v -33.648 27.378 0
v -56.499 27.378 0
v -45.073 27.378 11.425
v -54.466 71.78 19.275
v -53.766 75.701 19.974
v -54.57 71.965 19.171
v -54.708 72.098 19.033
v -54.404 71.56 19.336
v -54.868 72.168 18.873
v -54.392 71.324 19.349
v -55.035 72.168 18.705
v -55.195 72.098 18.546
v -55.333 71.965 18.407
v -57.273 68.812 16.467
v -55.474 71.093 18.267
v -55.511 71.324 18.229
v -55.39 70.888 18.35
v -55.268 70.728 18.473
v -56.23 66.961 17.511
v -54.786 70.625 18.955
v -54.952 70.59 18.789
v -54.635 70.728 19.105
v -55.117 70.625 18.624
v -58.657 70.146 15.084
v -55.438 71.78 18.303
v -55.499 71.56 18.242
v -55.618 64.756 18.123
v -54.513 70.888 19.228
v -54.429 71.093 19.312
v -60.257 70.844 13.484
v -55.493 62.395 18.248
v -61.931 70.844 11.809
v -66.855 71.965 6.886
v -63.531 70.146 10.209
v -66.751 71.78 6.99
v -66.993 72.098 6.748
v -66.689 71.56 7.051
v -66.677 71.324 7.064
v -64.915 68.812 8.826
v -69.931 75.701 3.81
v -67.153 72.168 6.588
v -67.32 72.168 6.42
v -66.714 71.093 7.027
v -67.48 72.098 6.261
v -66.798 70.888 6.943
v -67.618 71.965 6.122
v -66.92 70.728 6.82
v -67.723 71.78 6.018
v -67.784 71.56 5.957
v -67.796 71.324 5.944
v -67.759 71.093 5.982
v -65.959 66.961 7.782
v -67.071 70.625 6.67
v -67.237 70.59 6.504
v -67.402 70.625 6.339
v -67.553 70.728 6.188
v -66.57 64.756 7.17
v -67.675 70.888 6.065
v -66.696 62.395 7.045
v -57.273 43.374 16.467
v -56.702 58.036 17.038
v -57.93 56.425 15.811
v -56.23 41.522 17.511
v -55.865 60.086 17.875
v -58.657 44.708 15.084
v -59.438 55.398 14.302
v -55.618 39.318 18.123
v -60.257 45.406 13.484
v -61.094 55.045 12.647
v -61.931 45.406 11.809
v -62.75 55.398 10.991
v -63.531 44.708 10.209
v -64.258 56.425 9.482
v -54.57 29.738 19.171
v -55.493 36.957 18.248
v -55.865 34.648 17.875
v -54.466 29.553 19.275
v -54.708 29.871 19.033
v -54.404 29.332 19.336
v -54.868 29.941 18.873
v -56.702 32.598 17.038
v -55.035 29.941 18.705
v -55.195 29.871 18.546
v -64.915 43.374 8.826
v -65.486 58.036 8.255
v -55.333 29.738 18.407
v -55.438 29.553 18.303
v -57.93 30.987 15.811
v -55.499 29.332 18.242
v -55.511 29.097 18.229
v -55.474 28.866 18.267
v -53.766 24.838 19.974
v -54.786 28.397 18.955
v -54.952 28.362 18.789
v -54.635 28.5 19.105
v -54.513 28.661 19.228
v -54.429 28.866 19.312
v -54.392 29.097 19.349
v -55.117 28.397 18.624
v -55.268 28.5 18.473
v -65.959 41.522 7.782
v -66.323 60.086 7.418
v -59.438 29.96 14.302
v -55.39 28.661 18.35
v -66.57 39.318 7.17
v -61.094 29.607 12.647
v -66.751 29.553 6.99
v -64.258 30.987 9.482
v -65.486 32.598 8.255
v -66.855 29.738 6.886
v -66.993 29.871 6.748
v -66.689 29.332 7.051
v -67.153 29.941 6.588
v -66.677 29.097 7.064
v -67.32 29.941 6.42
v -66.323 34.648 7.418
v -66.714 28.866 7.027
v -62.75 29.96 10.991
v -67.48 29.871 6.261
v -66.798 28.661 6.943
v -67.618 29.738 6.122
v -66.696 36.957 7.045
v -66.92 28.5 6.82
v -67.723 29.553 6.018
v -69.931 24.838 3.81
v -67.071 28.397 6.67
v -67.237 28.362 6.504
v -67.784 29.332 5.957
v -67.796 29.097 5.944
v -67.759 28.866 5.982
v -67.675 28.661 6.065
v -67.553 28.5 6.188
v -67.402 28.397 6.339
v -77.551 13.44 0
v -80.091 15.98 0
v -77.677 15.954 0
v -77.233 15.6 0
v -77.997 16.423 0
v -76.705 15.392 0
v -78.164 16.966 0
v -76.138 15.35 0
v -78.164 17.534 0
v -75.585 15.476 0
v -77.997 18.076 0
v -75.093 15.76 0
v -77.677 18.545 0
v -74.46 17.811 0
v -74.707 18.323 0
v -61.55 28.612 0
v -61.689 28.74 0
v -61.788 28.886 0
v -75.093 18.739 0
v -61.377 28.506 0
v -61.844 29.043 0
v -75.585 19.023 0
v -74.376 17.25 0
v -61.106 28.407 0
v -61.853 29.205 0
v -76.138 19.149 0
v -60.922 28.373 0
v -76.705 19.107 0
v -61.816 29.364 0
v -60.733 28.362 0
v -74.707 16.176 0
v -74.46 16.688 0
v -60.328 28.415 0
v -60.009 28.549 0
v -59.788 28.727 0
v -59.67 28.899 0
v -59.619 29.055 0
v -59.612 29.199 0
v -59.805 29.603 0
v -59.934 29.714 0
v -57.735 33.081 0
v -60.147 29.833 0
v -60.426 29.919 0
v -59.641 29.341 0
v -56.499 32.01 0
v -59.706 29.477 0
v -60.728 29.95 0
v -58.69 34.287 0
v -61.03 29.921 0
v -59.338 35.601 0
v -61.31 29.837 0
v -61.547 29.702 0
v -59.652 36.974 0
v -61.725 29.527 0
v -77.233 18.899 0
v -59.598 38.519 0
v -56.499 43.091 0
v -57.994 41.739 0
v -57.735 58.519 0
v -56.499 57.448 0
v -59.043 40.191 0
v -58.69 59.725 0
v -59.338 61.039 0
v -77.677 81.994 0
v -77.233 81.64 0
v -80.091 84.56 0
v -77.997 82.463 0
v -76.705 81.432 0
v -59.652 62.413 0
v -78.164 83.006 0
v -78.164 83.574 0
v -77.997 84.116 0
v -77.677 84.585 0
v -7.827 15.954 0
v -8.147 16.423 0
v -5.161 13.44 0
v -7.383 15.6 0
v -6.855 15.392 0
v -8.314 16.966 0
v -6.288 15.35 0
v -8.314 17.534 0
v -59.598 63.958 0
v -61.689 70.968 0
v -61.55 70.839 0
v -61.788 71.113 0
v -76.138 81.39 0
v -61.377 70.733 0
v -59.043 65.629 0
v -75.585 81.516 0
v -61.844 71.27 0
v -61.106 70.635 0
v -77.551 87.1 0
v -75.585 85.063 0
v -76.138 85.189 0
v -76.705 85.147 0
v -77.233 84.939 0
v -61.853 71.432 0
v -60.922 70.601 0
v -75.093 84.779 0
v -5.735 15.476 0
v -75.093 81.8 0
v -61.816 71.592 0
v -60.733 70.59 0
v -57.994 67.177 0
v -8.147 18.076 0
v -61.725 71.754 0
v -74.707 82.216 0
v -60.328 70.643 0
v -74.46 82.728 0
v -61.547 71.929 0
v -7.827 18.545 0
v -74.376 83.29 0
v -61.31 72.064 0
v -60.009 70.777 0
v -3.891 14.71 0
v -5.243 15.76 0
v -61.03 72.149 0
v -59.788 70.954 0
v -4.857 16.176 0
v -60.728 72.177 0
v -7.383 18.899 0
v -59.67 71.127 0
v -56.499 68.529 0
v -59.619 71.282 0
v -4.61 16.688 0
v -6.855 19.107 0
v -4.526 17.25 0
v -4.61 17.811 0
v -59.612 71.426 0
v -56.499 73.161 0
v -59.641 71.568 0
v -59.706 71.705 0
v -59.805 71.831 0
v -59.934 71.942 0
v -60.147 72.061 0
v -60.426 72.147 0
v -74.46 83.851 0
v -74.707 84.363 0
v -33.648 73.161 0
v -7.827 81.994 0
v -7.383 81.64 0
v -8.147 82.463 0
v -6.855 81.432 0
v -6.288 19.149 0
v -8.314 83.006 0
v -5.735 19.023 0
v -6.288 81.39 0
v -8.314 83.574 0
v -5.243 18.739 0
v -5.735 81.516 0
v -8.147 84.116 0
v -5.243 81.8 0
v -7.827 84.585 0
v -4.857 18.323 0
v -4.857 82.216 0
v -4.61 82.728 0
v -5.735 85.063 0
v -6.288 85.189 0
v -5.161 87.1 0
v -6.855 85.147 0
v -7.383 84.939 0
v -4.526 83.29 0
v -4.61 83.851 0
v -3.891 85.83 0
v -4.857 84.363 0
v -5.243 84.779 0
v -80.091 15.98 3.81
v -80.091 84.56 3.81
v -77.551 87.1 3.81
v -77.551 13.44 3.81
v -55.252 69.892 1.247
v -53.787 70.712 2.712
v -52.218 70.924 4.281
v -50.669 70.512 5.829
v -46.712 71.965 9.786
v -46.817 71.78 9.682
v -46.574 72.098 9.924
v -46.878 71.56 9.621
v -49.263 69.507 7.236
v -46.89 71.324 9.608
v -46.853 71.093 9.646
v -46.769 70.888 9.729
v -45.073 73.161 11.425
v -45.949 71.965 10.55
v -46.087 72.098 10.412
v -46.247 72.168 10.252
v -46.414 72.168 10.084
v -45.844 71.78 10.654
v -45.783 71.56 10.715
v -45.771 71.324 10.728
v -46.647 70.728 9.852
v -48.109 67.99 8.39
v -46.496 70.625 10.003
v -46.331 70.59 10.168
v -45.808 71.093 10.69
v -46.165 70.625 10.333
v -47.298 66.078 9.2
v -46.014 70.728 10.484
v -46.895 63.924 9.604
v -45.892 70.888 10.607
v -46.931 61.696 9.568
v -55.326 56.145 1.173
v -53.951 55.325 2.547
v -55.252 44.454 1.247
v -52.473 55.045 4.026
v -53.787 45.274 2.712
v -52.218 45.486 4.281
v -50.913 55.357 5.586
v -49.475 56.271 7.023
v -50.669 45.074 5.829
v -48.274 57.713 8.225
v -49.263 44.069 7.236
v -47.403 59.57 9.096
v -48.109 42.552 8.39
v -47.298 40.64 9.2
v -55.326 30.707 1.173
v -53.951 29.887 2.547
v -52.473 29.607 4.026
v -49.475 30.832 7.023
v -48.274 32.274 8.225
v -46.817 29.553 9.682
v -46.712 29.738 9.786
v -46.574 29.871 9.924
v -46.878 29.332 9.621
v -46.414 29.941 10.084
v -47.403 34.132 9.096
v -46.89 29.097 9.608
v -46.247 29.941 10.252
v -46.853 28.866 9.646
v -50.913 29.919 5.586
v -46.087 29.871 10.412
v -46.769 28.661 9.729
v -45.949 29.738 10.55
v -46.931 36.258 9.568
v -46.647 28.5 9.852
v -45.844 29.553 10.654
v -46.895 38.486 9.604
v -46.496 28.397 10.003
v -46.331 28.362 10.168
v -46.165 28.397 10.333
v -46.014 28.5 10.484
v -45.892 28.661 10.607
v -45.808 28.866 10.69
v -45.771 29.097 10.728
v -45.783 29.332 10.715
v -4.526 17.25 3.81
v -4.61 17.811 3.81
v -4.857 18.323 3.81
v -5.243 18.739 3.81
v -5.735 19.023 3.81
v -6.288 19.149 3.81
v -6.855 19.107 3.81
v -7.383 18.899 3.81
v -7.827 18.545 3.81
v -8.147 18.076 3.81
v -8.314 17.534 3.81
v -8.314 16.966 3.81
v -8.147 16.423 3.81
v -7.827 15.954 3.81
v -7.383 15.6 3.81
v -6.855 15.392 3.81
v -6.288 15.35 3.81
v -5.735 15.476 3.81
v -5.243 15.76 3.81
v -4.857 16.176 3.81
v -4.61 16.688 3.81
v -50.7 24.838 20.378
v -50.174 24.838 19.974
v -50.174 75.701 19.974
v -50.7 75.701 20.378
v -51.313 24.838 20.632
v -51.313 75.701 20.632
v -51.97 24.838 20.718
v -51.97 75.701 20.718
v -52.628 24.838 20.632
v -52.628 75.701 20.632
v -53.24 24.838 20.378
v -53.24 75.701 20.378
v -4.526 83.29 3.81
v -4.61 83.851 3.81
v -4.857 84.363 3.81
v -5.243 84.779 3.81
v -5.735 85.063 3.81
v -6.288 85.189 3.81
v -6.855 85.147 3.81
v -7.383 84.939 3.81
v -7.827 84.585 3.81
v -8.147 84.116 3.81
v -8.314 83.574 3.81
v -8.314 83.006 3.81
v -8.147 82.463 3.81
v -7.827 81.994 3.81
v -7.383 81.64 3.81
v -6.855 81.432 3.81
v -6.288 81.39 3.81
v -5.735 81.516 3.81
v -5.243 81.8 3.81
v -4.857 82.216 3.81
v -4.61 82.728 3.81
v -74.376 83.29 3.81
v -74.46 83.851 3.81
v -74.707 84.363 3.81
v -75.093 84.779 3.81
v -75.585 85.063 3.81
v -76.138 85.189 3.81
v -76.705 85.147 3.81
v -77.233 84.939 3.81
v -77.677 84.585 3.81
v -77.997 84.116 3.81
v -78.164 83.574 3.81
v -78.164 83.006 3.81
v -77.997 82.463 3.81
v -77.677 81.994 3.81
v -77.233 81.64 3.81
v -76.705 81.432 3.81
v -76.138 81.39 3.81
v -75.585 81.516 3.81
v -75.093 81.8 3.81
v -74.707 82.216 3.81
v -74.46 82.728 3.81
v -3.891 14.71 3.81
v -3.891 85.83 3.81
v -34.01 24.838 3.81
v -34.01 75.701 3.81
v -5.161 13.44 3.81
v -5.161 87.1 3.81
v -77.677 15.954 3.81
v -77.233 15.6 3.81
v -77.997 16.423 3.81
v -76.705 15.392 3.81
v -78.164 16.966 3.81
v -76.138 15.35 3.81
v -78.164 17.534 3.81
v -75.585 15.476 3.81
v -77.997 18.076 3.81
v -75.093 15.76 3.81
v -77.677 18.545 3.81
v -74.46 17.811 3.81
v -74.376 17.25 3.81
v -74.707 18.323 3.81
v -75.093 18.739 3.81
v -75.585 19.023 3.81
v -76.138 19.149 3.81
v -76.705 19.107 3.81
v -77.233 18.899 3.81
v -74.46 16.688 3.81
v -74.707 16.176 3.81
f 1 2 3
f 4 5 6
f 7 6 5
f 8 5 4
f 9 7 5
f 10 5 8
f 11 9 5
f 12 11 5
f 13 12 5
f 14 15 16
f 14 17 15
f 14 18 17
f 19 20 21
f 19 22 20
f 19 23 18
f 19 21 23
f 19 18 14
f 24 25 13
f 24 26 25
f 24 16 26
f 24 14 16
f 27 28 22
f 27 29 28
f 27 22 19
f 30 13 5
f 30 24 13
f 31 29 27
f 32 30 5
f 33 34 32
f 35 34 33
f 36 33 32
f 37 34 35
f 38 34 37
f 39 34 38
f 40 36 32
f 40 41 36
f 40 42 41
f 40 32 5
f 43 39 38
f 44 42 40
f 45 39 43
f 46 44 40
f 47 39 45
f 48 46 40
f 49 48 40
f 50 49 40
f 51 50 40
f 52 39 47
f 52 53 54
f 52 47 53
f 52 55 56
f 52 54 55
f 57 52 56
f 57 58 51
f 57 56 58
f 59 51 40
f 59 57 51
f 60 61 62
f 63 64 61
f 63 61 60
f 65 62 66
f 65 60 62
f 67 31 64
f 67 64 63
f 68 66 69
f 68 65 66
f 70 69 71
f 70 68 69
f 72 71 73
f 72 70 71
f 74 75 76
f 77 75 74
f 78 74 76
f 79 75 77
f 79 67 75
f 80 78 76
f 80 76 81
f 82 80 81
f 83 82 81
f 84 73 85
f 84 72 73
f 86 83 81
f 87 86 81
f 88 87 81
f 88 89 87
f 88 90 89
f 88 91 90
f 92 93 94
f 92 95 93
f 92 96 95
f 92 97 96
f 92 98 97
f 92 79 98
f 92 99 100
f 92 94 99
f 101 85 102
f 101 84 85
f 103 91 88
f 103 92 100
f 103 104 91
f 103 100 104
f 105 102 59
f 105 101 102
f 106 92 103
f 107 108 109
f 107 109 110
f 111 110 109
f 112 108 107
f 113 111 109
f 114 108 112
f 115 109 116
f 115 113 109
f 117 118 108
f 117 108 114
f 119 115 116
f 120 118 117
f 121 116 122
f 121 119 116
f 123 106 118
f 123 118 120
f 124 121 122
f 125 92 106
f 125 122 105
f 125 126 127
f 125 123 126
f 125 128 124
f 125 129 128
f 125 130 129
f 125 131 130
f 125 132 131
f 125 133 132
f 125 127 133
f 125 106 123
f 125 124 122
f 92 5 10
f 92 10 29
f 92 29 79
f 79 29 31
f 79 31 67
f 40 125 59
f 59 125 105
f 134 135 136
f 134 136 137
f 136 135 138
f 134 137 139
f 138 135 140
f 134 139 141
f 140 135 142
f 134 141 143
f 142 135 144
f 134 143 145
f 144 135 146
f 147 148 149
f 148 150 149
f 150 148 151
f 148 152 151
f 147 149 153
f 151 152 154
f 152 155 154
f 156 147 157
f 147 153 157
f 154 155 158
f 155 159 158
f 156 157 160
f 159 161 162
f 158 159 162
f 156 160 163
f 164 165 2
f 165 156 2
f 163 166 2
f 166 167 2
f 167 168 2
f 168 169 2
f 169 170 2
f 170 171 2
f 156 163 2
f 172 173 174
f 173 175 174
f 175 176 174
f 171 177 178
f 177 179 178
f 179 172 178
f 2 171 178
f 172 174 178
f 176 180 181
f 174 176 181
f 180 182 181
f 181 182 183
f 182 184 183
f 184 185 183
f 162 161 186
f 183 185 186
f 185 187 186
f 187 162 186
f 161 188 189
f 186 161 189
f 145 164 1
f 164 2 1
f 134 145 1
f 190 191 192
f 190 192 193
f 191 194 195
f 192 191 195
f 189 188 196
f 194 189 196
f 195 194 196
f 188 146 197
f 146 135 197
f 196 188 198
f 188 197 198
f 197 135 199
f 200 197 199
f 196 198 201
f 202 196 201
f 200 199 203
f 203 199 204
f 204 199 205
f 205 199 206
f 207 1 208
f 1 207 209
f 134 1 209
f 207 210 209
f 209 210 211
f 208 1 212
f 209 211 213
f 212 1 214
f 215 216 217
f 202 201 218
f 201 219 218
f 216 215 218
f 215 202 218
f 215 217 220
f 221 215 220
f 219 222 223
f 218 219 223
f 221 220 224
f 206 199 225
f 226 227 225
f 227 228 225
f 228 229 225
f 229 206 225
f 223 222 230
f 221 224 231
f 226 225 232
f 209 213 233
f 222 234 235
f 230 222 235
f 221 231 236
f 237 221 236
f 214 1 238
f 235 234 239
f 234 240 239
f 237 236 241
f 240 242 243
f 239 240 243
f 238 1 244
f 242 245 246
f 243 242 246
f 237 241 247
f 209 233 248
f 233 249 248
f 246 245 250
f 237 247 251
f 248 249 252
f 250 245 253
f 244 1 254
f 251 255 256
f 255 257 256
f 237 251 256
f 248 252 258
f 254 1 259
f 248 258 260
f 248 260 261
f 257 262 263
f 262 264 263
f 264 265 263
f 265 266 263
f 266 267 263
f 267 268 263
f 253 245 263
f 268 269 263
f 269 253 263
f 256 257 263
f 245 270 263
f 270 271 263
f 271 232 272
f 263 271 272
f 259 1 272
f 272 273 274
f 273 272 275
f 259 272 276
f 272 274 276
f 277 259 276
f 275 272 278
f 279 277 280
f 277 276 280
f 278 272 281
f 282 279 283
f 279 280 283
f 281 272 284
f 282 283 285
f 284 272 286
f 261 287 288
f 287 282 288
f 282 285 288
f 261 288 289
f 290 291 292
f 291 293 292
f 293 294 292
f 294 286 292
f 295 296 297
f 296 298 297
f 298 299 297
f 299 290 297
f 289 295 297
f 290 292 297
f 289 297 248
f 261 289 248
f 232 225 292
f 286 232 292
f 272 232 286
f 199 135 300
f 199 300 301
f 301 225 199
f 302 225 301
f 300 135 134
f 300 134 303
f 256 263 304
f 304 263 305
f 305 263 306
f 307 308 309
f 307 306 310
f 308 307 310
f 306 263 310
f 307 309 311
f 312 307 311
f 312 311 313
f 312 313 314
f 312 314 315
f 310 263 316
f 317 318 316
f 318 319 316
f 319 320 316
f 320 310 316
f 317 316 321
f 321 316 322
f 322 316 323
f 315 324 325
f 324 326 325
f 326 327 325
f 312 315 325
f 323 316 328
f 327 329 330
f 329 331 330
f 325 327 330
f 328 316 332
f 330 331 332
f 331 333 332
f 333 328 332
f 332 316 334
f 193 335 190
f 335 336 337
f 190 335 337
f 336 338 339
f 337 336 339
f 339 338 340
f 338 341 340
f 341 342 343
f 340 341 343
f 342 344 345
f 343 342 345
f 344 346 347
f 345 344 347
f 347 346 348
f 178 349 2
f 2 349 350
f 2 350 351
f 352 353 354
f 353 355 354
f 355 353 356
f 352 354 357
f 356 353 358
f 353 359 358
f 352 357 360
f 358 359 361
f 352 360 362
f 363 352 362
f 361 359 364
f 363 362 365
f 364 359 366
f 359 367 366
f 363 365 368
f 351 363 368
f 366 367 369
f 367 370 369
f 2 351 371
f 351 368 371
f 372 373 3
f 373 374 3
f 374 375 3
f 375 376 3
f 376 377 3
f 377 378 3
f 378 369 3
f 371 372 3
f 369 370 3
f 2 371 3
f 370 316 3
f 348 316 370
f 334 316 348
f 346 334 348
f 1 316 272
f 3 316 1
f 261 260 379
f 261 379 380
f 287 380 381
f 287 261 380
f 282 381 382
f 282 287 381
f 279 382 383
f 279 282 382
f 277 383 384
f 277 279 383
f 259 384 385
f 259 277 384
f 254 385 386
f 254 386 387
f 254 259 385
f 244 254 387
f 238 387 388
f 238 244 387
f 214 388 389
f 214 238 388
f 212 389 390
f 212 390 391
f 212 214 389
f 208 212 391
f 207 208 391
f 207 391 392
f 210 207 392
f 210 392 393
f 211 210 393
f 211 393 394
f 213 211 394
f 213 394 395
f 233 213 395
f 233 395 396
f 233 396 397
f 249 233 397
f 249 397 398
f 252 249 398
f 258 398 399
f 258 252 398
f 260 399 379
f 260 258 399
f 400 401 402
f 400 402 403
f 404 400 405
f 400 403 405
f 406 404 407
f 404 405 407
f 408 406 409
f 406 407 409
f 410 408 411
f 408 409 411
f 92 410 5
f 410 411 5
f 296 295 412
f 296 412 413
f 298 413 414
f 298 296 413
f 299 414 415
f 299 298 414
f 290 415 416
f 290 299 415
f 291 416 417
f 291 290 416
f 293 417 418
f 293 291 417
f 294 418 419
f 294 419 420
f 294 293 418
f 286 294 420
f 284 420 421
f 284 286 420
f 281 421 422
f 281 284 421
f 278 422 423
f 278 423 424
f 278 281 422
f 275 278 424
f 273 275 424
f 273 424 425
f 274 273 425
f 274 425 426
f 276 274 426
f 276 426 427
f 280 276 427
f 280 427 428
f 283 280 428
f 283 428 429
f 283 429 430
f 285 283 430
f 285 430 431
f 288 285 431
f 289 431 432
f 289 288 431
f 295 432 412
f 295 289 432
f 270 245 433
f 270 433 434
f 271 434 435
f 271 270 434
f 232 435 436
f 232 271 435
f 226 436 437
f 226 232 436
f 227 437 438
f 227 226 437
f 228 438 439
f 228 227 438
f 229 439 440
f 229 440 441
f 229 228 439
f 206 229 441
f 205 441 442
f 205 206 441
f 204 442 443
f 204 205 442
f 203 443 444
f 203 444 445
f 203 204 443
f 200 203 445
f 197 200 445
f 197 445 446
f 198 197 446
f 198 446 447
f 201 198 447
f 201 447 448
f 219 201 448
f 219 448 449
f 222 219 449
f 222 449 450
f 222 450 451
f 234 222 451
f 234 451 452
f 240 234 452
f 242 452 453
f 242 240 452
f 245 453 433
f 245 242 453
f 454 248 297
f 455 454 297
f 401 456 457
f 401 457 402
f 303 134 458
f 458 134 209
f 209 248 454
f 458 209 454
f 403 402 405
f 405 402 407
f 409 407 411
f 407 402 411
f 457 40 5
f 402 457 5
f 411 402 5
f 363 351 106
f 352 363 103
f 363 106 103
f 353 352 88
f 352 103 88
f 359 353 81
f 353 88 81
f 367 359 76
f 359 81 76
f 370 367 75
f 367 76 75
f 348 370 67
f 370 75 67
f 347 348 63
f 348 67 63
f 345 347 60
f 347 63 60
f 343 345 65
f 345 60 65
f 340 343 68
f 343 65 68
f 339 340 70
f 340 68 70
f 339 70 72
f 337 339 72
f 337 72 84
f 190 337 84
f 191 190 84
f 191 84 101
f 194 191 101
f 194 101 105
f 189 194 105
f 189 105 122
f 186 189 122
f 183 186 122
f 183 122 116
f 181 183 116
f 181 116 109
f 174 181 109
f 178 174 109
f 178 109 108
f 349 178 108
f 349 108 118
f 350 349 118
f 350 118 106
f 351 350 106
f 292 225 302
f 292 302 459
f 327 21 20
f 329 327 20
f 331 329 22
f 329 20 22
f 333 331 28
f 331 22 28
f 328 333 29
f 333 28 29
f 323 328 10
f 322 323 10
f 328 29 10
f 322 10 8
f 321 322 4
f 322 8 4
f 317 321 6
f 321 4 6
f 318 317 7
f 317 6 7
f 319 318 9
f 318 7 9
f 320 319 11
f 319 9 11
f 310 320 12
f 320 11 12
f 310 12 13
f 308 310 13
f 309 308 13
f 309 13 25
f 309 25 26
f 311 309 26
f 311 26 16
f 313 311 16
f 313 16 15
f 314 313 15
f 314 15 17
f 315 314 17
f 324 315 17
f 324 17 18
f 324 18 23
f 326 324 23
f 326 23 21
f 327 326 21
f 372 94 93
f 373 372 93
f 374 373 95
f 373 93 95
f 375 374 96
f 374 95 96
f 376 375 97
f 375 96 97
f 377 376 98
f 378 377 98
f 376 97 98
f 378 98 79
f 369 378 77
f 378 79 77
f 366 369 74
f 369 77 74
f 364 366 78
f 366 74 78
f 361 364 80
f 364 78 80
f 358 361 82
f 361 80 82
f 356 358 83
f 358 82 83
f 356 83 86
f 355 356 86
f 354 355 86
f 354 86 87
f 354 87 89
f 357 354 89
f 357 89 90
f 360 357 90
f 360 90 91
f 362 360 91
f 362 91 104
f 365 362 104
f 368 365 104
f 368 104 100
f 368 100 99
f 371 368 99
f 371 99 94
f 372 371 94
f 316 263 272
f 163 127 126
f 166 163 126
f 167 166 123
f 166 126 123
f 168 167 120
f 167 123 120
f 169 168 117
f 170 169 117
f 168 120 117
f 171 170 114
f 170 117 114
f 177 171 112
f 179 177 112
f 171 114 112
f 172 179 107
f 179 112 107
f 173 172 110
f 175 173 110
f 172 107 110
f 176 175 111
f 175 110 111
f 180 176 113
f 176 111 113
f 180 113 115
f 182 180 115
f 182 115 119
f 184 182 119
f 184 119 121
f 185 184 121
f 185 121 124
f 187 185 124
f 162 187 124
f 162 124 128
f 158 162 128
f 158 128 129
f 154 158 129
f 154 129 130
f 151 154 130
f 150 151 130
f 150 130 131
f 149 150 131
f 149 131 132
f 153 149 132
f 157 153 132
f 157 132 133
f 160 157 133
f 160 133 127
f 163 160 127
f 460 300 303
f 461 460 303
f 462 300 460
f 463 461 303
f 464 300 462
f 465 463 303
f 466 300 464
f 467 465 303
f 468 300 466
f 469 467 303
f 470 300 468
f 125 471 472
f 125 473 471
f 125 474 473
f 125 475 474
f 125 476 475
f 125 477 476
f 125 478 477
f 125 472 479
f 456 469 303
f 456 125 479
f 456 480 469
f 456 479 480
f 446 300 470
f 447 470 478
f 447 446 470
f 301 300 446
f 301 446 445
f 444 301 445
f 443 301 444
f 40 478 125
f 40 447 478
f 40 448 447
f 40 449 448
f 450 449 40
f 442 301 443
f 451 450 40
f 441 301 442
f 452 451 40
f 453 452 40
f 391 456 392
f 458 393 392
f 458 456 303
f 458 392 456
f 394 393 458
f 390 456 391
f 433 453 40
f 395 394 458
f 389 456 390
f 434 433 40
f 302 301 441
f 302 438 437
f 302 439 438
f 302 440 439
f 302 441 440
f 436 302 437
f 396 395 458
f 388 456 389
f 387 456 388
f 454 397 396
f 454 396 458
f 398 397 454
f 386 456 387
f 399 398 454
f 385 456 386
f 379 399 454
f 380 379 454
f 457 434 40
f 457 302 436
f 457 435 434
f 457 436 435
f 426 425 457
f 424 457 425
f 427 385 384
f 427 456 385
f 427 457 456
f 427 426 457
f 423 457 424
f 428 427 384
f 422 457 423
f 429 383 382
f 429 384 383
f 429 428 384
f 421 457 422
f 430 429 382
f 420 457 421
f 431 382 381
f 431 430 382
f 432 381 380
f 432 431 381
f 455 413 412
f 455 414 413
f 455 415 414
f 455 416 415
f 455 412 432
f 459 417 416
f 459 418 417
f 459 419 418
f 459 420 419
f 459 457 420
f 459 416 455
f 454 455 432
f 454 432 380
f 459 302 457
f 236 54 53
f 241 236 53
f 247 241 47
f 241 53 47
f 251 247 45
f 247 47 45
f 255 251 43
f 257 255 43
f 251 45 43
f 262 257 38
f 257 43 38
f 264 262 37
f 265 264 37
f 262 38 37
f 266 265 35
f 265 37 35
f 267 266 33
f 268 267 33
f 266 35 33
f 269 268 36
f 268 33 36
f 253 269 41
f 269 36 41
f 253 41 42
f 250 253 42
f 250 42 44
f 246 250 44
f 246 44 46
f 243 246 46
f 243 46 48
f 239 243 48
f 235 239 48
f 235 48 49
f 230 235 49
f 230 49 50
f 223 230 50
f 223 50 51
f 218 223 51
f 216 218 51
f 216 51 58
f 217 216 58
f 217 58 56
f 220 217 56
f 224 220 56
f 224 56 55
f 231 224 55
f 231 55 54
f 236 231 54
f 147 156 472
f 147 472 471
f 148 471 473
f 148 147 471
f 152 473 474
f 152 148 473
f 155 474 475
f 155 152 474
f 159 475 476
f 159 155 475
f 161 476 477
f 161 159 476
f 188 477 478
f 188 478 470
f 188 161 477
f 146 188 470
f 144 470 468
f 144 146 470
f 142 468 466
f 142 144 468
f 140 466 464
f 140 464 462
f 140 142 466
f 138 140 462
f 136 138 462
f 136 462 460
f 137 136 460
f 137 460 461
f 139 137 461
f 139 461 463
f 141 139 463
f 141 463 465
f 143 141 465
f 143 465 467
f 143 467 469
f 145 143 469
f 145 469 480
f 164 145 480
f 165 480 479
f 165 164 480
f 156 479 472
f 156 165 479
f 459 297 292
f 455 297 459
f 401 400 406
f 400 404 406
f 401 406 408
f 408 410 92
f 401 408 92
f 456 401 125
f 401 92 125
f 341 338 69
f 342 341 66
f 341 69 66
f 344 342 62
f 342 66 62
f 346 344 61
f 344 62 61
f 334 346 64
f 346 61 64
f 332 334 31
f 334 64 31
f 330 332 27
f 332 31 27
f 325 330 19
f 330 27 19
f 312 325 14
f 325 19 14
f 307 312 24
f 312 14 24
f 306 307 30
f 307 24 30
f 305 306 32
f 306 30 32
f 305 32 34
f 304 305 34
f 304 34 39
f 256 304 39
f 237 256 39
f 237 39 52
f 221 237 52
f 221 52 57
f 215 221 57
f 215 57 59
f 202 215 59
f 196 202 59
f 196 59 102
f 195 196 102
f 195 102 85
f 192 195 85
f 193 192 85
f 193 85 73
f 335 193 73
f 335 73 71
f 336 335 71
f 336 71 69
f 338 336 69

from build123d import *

# Parameters (mm, degrees)
F0_W      = 76.2
F0_H      = 73.66
F0_R      = 1.905
F1_DEPTH  = 3.81
F2_SIZE   = 1.27
F3_SIZE   = 2.54
F5_DEPTH  = 73.66
F6_R      = 7.94385
F6_R_2    = 0.79375
F7_DEPTH  = 49.3924086659
F9_W      = 45.7835
F9_H      = 20.9296
F9_W_2    = 45.2755
F9_H_2    = 20.4216
F9_R      = 0.79375
F10_DEPTH = 25.4
F12_DEPTH = 76.201
F13_R     = 2.54


with BuildPart() as f1:
    # F0 (on Top) → F1 (new body)
    with BuildSketch(Plane.XY):
        with Locations((-41.9906750321, 50.2695810336)):
            Rectangle(F0_W, F0_H)
        with Locations((-76.2806750321, 17.2495810336)):
            Circle(F0_R, mode=Mode.SUBTRACT)
        with Locations((-6.4306750321, 17.2495810336)):
            Circle(F0_R, mode=Mode.SUBTRACT)
        with Locations((-76.2806750321, 83.2895810336)):
            Circle(F0_R, mode=Mode.SUBTRACT)
        with Locations((-6.4306750321, 83.2895810336)):
            Circle(F0_R, mode=Mode.SUBTRACT)
    extrude(amount=F1_DEPTH)

    # F2
    f2_edges = [f1.edges().sort_by_distance(p)[0] for p in [
        (-3.890675, 13.439581, 1.905),
        (-3.890675, 87.099581, 1.905),
    ]]
    chamfer(f2_edges, length=F2_SIZE)

    # F3
    f3_edges = [f1.edges().sort_by_distance(p)[0] for p in [
        (-80.090675, 13.439581, 1.905),
        (-80.090675, 87.099581, 1.905),
    ]]
    chamfer(f3_edges, length=F3_SIZE)

    # F4 (on face) → F5 (join, through all)
    with BuildSketch(Plane.XZ.offset(-13.4395810336)):
        Polygon((-51.97016279, 21.7705122421), (-69.9306750321, 3.81), (-34.0096505479, 3.81), align=None)
    extrude(amount=-F5_DEPTH)

    # F6 (on face) → F7 (cut, through all)
    with BuildSketch(Plane(origin=(-36.8703375161, 0, 36.8703375161), x_dir=(0, -1, 0), z_dir=(-0.7071067812, 0, 0.7071067812))):
        with Locations((-62.9886310336, -34.2575776919)):
            Circle(F6_R)
        with Locations((-37.5505310336, -34.2575776919)):
            Circle(F6_R)
        with Locations((-29.1558310336, -25.5707776919)):
            Circle(F6_R_2)
        with Locations((-29.1558310336, -42.9443776919)):
            Circle(F6_R_2)
        with Locations((-71.3833310336, -42.9443776919)):
            Circle(F6_R_2)
        with Locations((-71.3833310336, -25.5707776919)):
            Circle(F6_R_2)
    extrude(amount=-F7_DEPTH, mode=Mode.SUBTRACT)

    # F9 (on offset) → F10 (cut)
    with BuildSketch(Plane(origin=(-28.2492916398, 0, 28.2492916398), x_dir=(0, -1, 0), z_dir=(-0.7071067812, 0, 0.7071067812))):
        with Locations((-50.2695810336, -34.2575776919)):
            Rectangle(F9_W, F9_H)
        with Locations((-50.2695810336, -34.2575776919)):
            Rectangle(F9_W_2, F9_H_2, mode=Mode.SUBTRACT)
        with Locations((-50.2695810336, -34.2575776919)):
            Rectangle(F9_W_2, F9_H_2)
        with Locations((-71.3833310336, -42.9443776919)):
            Circle(F9_R, mode=Mode.SUBTRACT)
        with Locations((-29.1558310336, -42.9443776919)):
            Circle(F9_R, mode=Mode.SUBTRACT)
        with Locations((-71.3833310336, -25.5707776919)):
            Circle(F9_R, mode=Mode.SUBTRACT)
        with Locations((-29.1558310336, -25.5707776919)):
            Circle(F9_R, mode=Mode.SUBTRACT)
        with Locations((-29.1558310336, -25.5707776919)):
            Circle(F9_R)
        with Locations((-29.1558310336, -42.9443776919)):
            Circle(F9_R)
        with Locations((-71.3833310336, -42.9443776919)):
            Circle(F9_R)
        with Locations((-71.3833310336, -25.5707776919)):
            Circle(F9_R)
    extrude(amount=-F10_DEPTH, mode=Mode.SUBTRACT)

    # F11 (on face) → F12 (cut, through all)
    with BuildSketch(Plane(origin=(-80.0906750321, 0, 0), x_dir=(0, -1, 0), z_dir=(-1, 0, 0))):
        Polygon((-84.5595810336, 3.81), (-75.7013310336, 3.81), (-75.7013310336, 27.0840693265), (-94.177685678, 27.0840693265), (-93.6518386006, 3.81), align=None)
        Polygon((-24.8378310336, 27.0840693265), (-24.8378310336, 3.81), (-15.9795810336, 3.81), (-6.8873234665, 3.81), (-6.3614763892, 27.0840693265), align=None)
    extrude(amount=-F12_DEPTH, mode=Mode.SUBTRACT)

    # F13
    f13_edges = [f1.edges().sort_by_distance(p)[0] for p in [
        (-51.970163, 50.269581, 21.770512),
    ]]
    fillet(f13_edges, radius=F13_R)


solid = f1.part
